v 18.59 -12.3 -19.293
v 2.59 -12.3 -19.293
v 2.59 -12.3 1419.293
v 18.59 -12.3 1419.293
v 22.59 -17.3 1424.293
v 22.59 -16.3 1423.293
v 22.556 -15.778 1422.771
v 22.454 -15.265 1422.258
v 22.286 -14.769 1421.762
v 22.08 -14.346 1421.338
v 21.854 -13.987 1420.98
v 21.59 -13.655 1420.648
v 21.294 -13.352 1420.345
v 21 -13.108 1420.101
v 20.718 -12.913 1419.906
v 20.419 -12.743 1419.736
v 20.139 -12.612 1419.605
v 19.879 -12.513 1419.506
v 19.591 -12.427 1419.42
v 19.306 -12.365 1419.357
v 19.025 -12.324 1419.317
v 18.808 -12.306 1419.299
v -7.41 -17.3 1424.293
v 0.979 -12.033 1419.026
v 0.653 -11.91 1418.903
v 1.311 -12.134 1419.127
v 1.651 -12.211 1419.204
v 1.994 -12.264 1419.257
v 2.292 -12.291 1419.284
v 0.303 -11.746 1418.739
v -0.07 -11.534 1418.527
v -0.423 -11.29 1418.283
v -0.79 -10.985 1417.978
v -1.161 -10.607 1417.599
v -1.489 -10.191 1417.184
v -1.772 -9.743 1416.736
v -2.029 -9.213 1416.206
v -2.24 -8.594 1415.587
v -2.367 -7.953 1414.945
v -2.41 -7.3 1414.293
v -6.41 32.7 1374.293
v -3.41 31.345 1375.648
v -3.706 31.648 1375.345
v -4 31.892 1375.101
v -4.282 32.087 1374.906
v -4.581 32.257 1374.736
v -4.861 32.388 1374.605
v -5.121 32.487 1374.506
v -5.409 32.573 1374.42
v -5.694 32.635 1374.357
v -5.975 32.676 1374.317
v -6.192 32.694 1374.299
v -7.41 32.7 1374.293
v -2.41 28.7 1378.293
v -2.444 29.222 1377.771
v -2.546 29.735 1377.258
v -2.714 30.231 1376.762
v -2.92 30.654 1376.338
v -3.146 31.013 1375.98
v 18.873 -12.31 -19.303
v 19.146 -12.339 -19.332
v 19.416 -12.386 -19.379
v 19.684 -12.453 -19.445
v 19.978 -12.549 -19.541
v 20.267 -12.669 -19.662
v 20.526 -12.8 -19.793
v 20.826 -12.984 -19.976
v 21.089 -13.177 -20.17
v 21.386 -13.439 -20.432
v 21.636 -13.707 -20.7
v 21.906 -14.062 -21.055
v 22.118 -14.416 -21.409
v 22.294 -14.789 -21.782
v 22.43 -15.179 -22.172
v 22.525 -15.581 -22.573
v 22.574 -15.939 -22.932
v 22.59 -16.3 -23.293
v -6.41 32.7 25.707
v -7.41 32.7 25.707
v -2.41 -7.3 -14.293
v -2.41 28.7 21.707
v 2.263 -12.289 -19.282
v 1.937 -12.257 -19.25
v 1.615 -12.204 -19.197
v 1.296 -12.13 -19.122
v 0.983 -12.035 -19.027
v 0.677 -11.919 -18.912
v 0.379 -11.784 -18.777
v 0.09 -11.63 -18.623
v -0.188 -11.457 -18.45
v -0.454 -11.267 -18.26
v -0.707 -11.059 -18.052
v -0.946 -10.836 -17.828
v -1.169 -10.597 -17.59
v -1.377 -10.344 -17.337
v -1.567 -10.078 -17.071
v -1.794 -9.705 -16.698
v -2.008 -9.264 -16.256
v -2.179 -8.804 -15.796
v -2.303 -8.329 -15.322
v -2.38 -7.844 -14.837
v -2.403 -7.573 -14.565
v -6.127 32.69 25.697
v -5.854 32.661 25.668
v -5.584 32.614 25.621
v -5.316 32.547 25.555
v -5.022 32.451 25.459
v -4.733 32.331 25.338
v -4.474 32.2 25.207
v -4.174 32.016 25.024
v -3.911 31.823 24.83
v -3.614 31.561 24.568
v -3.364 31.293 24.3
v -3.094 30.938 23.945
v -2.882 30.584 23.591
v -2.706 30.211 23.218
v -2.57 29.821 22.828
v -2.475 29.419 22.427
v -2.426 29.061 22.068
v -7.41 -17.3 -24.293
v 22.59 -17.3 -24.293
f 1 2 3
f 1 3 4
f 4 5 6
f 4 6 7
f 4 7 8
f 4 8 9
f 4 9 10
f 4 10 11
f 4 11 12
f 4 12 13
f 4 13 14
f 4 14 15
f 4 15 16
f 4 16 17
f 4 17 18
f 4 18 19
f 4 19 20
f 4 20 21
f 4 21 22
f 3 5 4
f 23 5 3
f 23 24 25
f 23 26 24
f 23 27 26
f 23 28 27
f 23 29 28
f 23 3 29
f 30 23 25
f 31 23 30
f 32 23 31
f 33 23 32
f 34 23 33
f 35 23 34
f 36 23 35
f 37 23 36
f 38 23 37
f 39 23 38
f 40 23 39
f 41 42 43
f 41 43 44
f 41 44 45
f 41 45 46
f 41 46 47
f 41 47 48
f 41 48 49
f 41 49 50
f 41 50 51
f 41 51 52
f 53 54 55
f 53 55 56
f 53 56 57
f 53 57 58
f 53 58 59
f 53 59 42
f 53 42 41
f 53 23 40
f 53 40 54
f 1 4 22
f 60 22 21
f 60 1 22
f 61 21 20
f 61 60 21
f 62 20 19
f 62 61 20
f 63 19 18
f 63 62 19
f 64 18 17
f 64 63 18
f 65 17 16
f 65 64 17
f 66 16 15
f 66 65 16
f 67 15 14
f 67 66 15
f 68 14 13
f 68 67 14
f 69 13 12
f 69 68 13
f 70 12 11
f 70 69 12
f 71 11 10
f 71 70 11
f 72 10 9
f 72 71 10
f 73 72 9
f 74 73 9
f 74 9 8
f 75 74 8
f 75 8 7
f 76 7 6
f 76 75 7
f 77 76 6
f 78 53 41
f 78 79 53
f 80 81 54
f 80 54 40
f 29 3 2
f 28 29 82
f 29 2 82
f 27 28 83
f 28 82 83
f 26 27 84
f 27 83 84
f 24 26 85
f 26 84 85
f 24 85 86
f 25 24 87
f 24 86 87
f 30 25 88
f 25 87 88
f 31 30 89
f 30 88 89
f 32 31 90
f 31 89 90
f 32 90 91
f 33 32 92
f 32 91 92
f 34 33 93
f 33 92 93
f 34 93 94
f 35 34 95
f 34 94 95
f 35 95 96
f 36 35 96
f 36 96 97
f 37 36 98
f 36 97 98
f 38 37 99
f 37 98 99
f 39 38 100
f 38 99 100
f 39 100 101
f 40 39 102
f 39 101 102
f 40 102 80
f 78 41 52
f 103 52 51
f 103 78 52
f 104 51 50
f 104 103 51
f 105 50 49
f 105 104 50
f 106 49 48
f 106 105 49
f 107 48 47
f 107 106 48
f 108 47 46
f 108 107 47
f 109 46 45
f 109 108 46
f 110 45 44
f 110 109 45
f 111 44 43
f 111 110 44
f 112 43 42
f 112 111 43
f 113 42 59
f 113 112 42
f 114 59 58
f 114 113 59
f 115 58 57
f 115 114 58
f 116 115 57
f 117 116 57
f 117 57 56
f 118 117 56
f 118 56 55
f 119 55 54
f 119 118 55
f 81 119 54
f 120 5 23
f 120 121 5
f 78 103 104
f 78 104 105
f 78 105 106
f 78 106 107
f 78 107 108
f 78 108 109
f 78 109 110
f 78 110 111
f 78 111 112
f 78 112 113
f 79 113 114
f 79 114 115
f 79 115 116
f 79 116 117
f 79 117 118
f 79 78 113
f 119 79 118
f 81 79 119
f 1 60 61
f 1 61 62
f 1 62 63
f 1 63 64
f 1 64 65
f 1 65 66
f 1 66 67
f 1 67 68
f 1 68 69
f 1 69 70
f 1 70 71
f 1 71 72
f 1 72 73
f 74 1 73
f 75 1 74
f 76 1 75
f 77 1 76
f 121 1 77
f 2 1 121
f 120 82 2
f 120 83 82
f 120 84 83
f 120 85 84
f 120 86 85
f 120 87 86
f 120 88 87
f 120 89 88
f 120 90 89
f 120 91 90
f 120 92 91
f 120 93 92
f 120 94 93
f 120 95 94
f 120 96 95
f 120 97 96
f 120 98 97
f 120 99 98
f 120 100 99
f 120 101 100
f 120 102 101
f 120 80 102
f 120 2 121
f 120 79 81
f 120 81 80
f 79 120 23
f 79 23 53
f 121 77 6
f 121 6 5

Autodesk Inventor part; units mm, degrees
ref_plane "Start Plane" through (0, 0, -24.2929) normal (0, 0, 1) x (1, 0, 0)
ref_plane "End Plane" through (0, 0, 1424.2929) normal (0, 0, 1) x (1, 0, 0)
sketch "Sketch" plane through (0, 0, 0) normal (0, 0, 1) x (1, 0, 0)
  line L0 (-2.41, 28.7) -> (-2.41, -7.3)
  line L1 (-7.41, 32.7) -> (-6.41, 32.7)
  line L2 (-7.41, -17.3) -> (-7.41, 32.7)
  line L3 (22.59, -17.3) -> (-7.41, -17.3)
  line L4 (22.59, -16.3) -> (22.59, -17.3)
  line L5 (2.59, -12.3) -> (18.59, -12.3)
  arc A0 (-2.41, -7.3) -> (2.59, -12.3) centre (2.59, -7.3) ccw
  arc A1 (-2.41, 28.7) -> (-6.41, 32.7) centre (-6.41, 28.7) ccw
  arc A2 (22.59, -16.3) -> (18.59, -12.3) centre (18.59, -16.3) ccw
  line L6 (0, 43.6941) -> (0, -27.4657) construction
  line L7 (-13.5757, 0) -> (29.5841, 0) construction
  point P0 (-2.41, 32.7)
  point P1 (-2.41, -12.3)
  point P2 (22.59, -12.3)
  dimension "d4" = 30
  dimension "d6" = 50
  dimension "d8" = 5
  dimension "d10" = 5
  dimension "d17" = 5
  dimension "d18" = 4
  dimension "d19" = 17.3
  dimension "d20" = 7.41
extrude "Body" add sketch "Sketch" along normal up to surface (1448.5858 mm away) from surface at -24.2929
sketch "Sketch3" plane through (0, 0, 0) normal (0, 0, 1) x (1, 0, 0)
  line L0 (0, 0) -> (10, 0)
ref_plane "Work Plane10" through (0, 0, 0) normal (0, -1, 0) x (1, 0, 0)
sketch "Sketch4" plane through (0, 0, 0) normal (0, -1, 0) x (1, 0, 0)
  line L0 (-2, -24.2929) -> (12, -24.2929)
  line L1 (-2, 1424.2929) -> (12, 1424.2929)
  dimension "d24" = 1448.5858
ref_plane "Work Plane11" through (7.59, -17.6536, 1424.6464) normal (0, 0.7071, 0.7071) x (1, 0, 0)
split "Split1" plane through (7.59, -17.6536, 1424.6464) removes the side toward (0, 0.7071, 0.7071)
ref_plane "Work Plane12" through (7.59, -17.6536, -24.6464) normal (0, 0.7071, -0.7071) x (1, 0, 0)
split "Split2" plane through (7.59, -17.6536, -24.6464) removes the side toward (0, 0.7071, -0.7071)
equation "\"d4\" = b"
equation "\"d6\" = ParH"
equation "\"d8\" = ParT"
equation "\"d10\" = ParT"
equation "\"d17\" = R"
equation "\"d18\" = R1"
equation "\"d19\" = ex"
equation "\"d20\" = ey"
equation "\"d11\" = G_L"
equation "\"b\" = 30"
equation "\"ParT\" = 5"
equation "\"R1\" = 4"
equation "\"G_L\" = d24"
equation "\"ParH\" = 50"
equation "\"R\" = 5"
equation "\"ey\" = 7.41"
equation "\"ex\" = 17.3"
equation "\"G_OFFSET_START\" = 24.29289"
equation "\"G_OFFSET_END\" = 24.29289"
equation "\"d21\" = -G_OFFSET_START"
equation "\"d22\" = G_OFFSET_END + B_L"
equation "\"B_L\" = 1400"
properties part number "ISO 657-2 - 50x 30x 5-1448.59" material "Steel, Mild"
